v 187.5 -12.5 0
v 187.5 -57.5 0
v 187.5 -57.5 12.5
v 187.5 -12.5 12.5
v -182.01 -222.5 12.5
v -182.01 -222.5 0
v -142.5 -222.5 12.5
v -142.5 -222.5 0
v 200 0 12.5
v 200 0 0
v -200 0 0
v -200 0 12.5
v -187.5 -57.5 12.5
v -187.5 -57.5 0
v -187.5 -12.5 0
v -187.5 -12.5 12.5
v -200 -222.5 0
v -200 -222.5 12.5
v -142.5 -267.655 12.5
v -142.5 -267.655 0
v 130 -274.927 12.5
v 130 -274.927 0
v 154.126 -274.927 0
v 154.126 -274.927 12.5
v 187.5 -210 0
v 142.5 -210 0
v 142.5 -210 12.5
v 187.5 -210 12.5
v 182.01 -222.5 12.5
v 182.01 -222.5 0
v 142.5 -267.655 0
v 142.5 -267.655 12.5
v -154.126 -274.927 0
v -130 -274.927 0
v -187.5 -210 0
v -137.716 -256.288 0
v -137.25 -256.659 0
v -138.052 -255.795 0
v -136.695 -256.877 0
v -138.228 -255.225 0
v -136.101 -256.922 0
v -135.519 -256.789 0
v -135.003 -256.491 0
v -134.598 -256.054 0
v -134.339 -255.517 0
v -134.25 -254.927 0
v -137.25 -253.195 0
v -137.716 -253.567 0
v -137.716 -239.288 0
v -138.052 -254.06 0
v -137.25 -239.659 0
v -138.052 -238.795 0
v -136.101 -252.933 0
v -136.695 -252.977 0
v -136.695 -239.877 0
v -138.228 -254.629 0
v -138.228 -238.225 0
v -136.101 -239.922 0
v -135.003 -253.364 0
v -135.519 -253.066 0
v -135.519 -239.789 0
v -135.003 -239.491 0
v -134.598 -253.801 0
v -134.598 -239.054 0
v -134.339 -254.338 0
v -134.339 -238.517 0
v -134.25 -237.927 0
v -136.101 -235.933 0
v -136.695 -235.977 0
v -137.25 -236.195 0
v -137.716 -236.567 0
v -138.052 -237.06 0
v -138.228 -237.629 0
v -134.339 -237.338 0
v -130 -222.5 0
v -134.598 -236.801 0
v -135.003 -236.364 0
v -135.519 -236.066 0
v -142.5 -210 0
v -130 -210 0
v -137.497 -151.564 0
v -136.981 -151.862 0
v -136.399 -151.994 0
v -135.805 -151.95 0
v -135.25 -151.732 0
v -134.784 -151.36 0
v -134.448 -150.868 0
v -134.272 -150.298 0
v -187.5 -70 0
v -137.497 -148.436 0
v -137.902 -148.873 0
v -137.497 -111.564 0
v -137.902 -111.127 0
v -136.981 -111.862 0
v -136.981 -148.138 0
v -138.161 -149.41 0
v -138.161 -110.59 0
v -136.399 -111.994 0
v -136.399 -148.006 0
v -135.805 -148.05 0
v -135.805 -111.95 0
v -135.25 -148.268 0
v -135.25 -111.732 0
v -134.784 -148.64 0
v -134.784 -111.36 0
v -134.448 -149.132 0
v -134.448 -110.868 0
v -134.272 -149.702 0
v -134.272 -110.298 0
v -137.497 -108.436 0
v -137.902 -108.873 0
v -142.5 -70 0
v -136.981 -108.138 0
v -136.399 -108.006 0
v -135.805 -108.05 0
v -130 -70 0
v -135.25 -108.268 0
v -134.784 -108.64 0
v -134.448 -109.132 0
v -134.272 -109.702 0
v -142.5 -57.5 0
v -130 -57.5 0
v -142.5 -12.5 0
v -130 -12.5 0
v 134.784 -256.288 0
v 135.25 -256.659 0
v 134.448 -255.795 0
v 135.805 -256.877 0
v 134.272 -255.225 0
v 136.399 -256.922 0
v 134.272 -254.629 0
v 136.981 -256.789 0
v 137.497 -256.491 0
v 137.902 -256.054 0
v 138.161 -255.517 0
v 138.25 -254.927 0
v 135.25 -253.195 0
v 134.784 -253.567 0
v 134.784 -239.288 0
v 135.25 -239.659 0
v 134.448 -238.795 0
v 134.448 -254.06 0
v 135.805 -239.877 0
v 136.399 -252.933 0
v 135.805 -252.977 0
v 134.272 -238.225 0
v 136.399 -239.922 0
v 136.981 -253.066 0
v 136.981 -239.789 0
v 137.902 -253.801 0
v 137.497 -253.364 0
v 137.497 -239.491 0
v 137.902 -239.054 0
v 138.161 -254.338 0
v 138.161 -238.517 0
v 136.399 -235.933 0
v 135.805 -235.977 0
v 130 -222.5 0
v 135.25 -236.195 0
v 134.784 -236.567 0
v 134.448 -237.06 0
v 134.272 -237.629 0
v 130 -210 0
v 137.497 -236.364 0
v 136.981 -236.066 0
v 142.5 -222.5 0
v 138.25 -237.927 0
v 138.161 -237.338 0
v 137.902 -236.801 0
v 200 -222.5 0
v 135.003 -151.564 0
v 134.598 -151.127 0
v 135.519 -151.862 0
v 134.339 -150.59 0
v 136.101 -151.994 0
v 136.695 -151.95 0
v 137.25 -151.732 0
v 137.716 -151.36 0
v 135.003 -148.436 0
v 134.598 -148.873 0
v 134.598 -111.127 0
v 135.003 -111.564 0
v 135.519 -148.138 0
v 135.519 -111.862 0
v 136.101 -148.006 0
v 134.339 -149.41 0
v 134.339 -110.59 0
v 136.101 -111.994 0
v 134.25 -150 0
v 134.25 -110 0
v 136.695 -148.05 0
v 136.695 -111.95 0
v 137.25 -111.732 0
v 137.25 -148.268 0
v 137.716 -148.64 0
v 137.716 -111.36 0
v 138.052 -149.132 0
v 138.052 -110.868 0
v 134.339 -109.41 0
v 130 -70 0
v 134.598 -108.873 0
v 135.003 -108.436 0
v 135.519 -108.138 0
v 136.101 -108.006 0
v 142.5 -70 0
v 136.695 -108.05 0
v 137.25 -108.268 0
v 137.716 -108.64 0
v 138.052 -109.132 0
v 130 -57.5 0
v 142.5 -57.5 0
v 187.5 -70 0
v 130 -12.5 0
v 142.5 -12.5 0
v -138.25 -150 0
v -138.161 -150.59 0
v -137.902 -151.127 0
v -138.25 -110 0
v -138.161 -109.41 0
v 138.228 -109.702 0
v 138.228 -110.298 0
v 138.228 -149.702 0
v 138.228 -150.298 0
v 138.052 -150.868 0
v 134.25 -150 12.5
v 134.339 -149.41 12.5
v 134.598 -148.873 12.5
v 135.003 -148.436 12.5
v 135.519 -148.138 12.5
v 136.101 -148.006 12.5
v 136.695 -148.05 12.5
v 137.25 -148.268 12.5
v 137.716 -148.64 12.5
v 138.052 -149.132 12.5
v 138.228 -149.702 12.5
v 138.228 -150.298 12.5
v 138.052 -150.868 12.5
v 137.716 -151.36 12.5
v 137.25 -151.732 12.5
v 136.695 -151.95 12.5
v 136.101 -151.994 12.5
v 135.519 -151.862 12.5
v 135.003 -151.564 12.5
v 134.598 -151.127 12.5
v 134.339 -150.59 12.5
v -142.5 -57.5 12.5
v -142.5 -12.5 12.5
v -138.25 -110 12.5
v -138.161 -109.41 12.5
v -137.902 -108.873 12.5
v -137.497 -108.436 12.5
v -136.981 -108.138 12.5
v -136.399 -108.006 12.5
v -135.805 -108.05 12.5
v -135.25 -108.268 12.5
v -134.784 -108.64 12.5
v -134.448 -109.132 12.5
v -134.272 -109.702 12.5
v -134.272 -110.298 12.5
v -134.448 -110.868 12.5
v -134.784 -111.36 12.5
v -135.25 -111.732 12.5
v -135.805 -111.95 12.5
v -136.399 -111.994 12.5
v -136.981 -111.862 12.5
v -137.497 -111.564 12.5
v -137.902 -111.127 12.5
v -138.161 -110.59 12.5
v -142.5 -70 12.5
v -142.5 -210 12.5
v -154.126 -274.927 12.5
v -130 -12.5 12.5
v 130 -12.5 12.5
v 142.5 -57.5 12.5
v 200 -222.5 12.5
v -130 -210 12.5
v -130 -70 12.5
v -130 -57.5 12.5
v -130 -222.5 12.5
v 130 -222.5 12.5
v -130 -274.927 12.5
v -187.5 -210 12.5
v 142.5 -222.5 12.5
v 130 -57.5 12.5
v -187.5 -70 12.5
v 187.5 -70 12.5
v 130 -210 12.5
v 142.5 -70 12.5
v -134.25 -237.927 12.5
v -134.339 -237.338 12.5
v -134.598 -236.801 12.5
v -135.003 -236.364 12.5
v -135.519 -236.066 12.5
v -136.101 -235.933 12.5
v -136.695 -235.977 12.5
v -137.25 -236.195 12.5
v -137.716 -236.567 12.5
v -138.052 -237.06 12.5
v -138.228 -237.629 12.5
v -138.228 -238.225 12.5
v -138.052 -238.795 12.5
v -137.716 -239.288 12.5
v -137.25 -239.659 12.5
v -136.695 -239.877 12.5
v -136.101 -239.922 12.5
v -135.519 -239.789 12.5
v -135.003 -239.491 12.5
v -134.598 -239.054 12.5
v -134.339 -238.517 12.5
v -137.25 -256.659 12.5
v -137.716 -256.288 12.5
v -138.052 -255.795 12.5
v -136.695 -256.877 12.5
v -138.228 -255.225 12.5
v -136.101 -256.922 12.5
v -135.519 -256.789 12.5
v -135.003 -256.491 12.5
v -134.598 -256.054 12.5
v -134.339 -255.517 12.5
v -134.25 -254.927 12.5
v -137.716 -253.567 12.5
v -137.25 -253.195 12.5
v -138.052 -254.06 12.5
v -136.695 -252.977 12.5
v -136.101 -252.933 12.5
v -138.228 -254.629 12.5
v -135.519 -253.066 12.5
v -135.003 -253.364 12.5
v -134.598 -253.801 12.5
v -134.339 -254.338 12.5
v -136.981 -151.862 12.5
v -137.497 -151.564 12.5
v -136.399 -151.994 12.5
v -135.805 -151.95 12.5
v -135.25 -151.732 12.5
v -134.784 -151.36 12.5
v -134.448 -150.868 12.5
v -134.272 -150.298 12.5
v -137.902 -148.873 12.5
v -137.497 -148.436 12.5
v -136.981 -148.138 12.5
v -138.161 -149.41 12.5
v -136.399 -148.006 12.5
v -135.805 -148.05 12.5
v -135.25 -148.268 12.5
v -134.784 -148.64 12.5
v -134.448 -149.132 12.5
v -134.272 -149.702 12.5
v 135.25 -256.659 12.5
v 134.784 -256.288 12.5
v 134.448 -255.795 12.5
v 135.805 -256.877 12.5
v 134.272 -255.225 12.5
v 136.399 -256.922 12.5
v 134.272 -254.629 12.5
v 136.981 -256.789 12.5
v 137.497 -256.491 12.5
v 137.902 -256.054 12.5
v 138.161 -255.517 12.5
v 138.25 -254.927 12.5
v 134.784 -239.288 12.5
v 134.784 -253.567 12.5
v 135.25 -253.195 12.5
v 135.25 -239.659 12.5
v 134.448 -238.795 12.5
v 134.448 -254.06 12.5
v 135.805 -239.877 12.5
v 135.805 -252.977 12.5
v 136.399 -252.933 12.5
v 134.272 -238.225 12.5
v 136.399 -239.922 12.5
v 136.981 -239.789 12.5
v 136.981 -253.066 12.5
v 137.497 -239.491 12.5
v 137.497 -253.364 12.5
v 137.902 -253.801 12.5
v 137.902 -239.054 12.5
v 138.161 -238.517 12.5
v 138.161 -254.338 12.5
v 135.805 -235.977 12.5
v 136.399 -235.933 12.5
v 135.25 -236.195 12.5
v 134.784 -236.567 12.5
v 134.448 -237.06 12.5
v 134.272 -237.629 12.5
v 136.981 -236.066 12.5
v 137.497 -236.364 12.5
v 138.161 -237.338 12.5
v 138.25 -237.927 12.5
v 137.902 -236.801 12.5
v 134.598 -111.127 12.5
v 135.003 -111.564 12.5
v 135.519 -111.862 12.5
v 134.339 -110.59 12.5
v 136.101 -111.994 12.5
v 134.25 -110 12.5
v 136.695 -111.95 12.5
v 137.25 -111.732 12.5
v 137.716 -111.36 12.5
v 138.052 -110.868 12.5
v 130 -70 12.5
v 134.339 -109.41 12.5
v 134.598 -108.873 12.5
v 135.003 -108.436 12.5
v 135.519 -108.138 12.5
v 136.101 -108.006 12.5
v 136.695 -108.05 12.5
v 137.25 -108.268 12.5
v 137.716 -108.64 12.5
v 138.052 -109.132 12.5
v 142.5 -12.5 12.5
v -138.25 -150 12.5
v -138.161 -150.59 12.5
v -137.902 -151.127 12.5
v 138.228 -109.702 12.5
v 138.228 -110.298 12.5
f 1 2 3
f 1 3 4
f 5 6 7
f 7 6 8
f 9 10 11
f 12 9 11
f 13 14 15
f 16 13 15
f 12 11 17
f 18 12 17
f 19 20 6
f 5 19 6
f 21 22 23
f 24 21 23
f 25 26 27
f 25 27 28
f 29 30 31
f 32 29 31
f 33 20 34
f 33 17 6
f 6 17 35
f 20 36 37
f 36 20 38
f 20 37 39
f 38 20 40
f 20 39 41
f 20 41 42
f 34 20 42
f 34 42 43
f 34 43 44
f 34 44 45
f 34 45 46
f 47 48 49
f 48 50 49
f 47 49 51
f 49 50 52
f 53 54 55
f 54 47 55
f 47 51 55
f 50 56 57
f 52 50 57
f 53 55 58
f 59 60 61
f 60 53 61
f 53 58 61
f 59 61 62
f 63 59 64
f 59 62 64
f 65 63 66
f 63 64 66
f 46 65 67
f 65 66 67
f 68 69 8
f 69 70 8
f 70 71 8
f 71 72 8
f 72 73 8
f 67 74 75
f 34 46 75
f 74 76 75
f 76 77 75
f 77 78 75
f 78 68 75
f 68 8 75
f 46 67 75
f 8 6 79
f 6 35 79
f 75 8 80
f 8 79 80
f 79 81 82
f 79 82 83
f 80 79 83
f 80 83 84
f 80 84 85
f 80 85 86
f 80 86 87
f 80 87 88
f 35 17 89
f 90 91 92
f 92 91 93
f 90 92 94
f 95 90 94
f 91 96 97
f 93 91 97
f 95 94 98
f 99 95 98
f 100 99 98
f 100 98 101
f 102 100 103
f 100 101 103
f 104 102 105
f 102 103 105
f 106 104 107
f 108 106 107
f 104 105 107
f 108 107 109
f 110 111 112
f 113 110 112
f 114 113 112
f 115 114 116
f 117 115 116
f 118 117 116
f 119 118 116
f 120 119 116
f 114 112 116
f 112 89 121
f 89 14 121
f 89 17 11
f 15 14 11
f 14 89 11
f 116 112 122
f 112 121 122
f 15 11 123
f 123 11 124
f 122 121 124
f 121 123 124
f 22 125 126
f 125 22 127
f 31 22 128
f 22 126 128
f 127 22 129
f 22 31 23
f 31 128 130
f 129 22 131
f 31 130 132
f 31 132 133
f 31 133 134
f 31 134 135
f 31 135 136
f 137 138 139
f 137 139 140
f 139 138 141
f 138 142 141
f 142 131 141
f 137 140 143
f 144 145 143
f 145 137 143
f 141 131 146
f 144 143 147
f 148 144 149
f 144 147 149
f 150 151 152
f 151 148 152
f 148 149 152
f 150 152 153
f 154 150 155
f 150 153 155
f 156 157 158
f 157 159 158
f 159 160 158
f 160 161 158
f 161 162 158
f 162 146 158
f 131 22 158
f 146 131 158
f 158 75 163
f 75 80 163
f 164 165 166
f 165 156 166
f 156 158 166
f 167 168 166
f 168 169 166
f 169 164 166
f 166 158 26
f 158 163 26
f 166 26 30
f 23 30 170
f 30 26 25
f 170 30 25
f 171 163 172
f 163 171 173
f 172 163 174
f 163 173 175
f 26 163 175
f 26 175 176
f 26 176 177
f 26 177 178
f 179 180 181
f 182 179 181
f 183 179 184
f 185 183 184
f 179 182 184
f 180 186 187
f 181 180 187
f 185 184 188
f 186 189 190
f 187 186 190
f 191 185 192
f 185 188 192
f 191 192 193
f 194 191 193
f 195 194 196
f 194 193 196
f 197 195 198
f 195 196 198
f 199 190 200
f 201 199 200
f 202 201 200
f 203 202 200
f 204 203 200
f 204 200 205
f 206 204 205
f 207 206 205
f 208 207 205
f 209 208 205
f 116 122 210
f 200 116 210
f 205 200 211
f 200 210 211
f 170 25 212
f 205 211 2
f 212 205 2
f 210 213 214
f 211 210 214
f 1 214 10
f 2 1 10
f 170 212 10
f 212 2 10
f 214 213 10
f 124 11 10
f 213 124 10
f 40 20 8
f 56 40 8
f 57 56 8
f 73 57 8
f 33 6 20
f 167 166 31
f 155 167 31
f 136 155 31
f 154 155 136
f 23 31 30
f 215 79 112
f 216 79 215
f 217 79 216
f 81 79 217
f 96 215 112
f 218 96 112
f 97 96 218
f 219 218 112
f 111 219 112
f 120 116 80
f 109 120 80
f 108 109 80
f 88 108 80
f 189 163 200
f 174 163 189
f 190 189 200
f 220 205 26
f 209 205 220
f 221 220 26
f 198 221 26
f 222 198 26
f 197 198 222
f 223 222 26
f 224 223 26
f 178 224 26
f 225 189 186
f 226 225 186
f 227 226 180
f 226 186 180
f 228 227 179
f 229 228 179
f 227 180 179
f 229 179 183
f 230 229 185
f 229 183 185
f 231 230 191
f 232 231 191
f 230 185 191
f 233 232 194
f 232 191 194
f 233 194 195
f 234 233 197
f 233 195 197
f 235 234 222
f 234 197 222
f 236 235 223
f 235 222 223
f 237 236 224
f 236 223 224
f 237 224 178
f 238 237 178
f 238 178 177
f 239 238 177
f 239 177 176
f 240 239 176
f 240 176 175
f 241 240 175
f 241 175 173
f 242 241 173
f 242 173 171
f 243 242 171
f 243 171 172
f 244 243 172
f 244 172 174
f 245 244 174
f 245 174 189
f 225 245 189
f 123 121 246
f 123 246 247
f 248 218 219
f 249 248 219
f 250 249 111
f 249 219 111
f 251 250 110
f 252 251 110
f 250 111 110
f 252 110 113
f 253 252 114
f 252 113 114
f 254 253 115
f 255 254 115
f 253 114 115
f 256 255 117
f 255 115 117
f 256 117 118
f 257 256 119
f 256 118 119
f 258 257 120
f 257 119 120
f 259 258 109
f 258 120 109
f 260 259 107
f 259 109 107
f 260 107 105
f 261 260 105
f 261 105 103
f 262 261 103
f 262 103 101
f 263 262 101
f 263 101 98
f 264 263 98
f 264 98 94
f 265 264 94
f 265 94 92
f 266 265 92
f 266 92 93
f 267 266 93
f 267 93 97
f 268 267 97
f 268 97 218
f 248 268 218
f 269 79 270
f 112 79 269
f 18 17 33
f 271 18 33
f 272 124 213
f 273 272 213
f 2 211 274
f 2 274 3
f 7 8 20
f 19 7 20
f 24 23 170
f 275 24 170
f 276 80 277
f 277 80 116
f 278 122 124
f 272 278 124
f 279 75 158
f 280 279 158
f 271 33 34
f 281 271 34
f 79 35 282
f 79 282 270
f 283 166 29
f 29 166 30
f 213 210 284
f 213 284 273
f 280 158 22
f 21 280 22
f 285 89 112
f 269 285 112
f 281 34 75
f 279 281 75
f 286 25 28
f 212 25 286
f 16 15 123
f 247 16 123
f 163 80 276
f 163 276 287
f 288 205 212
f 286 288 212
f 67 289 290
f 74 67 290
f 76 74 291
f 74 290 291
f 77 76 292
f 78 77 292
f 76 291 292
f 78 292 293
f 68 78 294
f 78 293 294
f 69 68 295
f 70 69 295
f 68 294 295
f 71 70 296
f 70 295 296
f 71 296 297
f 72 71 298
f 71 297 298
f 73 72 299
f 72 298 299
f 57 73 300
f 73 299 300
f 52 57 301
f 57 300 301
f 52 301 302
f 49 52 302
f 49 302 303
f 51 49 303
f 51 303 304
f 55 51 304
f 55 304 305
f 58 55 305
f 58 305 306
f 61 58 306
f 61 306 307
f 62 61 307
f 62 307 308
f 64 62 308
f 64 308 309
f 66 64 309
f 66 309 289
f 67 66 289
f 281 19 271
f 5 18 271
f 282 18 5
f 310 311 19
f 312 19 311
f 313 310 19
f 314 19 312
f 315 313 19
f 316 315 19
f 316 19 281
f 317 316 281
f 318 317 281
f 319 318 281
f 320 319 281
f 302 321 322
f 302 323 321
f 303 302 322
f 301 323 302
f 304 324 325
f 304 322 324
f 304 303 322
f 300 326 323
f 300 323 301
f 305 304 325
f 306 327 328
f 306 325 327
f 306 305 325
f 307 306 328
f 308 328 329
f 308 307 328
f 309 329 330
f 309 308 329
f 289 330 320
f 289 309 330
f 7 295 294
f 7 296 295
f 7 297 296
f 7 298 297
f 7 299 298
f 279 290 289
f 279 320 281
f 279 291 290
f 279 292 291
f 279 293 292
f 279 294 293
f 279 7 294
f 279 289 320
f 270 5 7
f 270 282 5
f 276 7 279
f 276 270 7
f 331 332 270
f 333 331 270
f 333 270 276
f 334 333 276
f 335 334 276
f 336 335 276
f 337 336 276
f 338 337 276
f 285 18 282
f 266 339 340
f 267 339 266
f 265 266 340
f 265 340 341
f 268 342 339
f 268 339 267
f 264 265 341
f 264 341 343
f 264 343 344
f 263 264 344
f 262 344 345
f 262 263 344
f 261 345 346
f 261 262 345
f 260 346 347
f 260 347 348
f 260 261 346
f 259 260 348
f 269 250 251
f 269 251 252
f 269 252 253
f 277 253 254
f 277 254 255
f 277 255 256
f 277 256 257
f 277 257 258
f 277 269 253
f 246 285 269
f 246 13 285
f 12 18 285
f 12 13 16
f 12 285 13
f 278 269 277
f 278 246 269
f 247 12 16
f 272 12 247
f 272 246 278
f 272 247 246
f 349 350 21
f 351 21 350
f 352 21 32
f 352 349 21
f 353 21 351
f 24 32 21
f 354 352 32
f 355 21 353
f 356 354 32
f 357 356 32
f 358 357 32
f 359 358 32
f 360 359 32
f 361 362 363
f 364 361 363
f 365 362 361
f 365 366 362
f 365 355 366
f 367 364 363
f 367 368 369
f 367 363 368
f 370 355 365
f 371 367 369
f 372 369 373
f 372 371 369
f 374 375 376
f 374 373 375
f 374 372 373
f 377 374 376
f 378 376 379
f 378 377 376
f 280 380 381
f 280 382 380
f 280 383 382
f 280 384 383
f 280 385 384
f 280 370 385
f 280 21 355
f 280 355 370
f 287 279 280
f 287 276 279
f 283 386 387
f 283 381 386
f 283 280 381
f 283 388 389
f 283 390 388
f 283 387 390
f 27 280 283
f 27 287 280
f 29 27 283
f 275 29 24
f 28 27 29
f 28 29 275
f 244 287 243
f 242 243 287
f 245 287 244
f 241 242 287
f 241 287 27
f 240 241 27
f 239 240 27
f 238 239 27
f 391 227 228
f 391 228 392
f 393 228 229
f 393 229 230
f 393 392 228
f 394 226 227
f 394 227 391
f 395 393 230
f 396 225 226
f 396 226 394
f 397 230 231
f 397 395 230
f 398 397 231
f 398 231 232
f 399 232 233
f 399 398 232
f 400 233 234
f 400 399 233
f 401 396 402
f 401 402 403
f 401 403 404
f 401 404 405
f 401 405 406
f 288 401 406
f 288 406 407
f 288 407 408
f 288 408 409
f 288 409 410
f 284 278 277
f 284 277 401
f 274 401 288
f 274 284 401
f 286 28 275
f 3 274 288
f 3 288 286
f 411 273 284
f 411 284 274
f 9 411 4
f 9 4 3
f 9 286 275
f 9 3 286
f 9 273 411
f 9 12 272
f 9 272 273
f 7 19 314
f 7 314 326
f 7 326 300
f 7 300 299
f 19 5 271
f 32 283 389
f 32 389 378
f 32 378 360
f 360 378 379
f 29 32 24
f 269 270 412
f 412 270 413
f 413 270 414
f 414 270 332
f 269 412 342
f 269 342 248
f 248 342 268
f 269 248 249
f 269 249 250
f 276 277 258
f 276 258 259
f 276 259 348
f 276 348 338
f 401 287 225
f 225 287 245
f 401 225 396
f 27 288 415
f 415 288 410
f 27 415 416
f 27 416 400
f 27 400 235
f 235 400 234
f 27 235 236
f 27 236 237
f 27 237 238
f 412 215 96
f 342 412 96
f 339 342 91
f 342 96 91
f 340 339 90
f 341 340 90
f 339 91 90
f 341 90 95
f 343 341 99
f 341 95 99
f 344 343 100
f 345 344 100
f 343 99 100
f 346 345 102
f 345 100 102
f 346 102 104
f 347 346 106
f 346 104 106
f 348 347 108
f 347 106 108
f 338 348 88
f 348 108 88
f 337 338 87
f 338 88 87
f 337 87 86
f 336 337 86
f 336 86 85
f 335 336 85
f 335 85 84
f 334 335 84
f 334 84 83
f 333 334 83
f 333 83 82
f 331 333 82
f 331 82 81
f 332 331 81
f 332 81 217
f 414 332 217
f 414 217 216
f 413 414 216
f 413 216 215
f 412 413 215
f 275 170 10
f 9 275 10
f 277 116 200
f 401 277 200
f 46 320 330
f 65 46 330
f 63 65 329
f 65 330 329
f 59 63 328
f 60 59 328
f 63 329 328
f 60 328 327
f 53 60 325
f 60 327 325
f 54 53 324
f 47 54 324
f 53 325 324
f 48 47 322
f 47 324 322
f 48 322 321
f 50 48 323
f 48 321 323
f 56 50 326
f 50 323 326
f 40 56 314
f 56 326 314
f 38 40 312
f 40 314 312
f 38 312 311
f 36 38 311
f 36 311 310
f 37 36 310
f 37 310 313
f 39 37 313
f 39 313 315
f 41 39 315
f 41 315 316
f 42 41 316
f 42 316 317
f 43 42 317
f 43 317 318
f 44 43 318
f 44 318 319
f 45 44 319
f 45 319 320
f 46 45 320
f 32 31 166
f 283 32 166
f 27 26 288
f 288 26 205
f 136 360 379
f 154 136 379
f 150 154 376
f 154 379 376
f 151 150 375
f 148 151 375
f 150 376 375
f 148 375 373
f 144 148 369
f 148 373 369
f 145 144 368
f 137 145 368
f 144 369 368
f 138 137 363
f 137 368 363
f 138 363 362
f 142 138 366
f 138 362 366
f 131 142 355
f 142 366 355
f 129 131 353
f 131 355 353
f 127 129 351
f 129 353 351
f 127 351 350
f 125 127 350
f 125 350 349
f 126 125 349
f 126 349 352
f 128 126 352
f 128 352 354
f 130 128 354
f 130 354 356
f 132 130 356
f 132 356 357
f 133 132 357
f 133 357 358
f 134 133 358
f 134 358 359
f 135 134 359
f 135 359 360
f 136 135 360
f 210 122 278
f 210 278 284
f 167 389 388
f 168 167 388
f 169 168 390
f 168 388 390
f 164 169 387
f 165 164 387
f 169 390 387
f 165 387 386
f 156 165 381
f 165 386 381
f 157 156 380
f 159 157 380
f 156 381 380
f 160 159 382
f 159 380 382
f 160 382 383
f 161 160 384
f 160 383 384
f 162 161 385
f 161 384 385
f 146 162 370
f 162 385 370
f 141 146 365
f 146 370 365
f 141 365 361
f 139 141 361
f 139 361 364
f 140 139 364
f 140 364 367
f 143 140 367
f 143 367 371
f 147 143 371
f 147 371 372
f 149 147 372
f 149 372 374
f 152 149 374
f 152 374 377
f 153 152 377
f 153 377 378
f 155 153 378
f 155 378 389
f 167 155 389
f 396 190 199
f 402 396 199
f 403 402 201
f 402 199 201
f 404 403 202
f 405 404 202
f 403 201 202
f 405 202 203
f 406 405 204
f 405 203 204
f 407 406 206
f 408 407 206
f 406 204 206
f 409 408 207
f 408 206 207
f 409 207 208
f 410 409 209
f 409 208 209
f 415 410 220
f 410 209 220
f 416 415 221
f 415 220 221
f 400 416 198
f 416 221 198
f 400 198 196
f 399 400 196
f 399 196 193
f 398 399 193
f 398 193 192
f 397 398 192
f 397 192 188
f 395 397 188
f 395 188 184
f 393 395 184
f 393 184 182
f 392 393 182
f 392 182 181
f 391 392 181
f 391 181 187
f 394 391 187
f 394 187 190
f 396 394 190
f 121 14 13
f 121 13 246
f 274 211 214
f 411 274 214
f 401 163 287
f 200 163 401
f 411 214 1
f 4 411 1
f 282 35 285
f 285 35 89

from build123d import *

# Parameters (mm, degrees)
SKETCH1_W           = 45
SKETCH1_H           = 140
SKETCH1_H_2         = 45
SKETCH1_W_2         = 260
BOSS_EXTRUDE1_DEPTH = 12.5
SKETCH2_R           = 2
CUT_EXTRUDE1_DEPTH  = 15
SKETCH3_R           = 2
CUT_EXTRUDE2_DEPTH  = 15


with BuildPart() as part:
    # Sketch1 → Boss-Extrude1 (new body)
    with BuildSketch(Plane.XY):
        Polygon((200, 0), (0, 0), (-200, 0), (-200, -222.5), (-154.126087164, -274.927328955), (-130, -274.927328955), (-130, -222.5), (130, -222.5), (130, -274.927328955), (154.126087164, -274.927328955), (200, -222.5), align=None)
        Polygon((-142.5, -267.654601682), (-182.010276472, -222.5), (-142.5, -222.5), align=None, mode=Mode.SUBTRACT)
        Polygon((142.5, -222.5), (182.010276472, -222.5), (142.5, -267.654601682), align=None, mode=Mode.SUBTRACT)
        with Locations((-165, -140)):
            Rectangle(SKETCH1_W, SKETCH1_H, mode=Mode.SUBTRACT)
        with Locations((-165, -35)):
            Rectangle(SKETCH1_W, SKETCH1_H_2, mode=Mode.SUBTRACT)
        with Locations((0, -35)):
            Rectangle(SKETCH1_W_2, SKETCH1_H_2, mode=Mode.SUBTRACT)
        with Locations((0, -140)):
            Rectangle(SKETCH1_W_2, SKETCH1_H, mode=Mode.SUBTRACT)
        with Locations((165, -140)):
            Rectangle(SKETCH1_W, SKETCH1_H, mode=Mode.SUBTRACT)
        with Locations((165, -35)):
            Rectangle(SKETCH1_W, SKETCH1_H_2, mode=Mode.SUBTRACT)
    extrude(amount=BOSS_EXTRUDE1_DEPTH)

    # Sketch2 → Cut-Extrude1 (cut)
    with BuildSketch(Plane(origin=(0, 0, 0), x_dir=(-1, 0, 0), z_dir=(0, 0, -1))):
        with Locations((136.25, -110)):
            Circle(SKETCH2_R)
        with Locations((136.25, -150)):
            Circle(SKETCH2_R)
        with Locations((-136.25, -110)):
            Circle(SKETCH2_R)
        with Locations((-136.25, -150)):
            Circle(SKETCH2_R)
    extrude(amount=-CUT_EXTRUDE1_DEPTH, mode=Mode.SUBTRACT)

    # Sketch3 → Cut-Extrude2 (cut)
    with BuildSketch(Plane.XY.offset(12.5)):
        with Locations((-136.25, -237.927328955)):
            Circle(SKETCH3_R)
        with Locations((-136.25, -254.927328955)):
            Circle(SKETCH3_R)
        with Locations((136.25, -254.927328955)):
            Circle(SKETCH3_R)
        with Locations((136.25, -237.927328955)):
            Circle(SKETCH3_R)
    extrude(amount=-CUT_EXTRUDE2_DEPTH, mode=Mode.SUBTRACT)


solid = part.part
